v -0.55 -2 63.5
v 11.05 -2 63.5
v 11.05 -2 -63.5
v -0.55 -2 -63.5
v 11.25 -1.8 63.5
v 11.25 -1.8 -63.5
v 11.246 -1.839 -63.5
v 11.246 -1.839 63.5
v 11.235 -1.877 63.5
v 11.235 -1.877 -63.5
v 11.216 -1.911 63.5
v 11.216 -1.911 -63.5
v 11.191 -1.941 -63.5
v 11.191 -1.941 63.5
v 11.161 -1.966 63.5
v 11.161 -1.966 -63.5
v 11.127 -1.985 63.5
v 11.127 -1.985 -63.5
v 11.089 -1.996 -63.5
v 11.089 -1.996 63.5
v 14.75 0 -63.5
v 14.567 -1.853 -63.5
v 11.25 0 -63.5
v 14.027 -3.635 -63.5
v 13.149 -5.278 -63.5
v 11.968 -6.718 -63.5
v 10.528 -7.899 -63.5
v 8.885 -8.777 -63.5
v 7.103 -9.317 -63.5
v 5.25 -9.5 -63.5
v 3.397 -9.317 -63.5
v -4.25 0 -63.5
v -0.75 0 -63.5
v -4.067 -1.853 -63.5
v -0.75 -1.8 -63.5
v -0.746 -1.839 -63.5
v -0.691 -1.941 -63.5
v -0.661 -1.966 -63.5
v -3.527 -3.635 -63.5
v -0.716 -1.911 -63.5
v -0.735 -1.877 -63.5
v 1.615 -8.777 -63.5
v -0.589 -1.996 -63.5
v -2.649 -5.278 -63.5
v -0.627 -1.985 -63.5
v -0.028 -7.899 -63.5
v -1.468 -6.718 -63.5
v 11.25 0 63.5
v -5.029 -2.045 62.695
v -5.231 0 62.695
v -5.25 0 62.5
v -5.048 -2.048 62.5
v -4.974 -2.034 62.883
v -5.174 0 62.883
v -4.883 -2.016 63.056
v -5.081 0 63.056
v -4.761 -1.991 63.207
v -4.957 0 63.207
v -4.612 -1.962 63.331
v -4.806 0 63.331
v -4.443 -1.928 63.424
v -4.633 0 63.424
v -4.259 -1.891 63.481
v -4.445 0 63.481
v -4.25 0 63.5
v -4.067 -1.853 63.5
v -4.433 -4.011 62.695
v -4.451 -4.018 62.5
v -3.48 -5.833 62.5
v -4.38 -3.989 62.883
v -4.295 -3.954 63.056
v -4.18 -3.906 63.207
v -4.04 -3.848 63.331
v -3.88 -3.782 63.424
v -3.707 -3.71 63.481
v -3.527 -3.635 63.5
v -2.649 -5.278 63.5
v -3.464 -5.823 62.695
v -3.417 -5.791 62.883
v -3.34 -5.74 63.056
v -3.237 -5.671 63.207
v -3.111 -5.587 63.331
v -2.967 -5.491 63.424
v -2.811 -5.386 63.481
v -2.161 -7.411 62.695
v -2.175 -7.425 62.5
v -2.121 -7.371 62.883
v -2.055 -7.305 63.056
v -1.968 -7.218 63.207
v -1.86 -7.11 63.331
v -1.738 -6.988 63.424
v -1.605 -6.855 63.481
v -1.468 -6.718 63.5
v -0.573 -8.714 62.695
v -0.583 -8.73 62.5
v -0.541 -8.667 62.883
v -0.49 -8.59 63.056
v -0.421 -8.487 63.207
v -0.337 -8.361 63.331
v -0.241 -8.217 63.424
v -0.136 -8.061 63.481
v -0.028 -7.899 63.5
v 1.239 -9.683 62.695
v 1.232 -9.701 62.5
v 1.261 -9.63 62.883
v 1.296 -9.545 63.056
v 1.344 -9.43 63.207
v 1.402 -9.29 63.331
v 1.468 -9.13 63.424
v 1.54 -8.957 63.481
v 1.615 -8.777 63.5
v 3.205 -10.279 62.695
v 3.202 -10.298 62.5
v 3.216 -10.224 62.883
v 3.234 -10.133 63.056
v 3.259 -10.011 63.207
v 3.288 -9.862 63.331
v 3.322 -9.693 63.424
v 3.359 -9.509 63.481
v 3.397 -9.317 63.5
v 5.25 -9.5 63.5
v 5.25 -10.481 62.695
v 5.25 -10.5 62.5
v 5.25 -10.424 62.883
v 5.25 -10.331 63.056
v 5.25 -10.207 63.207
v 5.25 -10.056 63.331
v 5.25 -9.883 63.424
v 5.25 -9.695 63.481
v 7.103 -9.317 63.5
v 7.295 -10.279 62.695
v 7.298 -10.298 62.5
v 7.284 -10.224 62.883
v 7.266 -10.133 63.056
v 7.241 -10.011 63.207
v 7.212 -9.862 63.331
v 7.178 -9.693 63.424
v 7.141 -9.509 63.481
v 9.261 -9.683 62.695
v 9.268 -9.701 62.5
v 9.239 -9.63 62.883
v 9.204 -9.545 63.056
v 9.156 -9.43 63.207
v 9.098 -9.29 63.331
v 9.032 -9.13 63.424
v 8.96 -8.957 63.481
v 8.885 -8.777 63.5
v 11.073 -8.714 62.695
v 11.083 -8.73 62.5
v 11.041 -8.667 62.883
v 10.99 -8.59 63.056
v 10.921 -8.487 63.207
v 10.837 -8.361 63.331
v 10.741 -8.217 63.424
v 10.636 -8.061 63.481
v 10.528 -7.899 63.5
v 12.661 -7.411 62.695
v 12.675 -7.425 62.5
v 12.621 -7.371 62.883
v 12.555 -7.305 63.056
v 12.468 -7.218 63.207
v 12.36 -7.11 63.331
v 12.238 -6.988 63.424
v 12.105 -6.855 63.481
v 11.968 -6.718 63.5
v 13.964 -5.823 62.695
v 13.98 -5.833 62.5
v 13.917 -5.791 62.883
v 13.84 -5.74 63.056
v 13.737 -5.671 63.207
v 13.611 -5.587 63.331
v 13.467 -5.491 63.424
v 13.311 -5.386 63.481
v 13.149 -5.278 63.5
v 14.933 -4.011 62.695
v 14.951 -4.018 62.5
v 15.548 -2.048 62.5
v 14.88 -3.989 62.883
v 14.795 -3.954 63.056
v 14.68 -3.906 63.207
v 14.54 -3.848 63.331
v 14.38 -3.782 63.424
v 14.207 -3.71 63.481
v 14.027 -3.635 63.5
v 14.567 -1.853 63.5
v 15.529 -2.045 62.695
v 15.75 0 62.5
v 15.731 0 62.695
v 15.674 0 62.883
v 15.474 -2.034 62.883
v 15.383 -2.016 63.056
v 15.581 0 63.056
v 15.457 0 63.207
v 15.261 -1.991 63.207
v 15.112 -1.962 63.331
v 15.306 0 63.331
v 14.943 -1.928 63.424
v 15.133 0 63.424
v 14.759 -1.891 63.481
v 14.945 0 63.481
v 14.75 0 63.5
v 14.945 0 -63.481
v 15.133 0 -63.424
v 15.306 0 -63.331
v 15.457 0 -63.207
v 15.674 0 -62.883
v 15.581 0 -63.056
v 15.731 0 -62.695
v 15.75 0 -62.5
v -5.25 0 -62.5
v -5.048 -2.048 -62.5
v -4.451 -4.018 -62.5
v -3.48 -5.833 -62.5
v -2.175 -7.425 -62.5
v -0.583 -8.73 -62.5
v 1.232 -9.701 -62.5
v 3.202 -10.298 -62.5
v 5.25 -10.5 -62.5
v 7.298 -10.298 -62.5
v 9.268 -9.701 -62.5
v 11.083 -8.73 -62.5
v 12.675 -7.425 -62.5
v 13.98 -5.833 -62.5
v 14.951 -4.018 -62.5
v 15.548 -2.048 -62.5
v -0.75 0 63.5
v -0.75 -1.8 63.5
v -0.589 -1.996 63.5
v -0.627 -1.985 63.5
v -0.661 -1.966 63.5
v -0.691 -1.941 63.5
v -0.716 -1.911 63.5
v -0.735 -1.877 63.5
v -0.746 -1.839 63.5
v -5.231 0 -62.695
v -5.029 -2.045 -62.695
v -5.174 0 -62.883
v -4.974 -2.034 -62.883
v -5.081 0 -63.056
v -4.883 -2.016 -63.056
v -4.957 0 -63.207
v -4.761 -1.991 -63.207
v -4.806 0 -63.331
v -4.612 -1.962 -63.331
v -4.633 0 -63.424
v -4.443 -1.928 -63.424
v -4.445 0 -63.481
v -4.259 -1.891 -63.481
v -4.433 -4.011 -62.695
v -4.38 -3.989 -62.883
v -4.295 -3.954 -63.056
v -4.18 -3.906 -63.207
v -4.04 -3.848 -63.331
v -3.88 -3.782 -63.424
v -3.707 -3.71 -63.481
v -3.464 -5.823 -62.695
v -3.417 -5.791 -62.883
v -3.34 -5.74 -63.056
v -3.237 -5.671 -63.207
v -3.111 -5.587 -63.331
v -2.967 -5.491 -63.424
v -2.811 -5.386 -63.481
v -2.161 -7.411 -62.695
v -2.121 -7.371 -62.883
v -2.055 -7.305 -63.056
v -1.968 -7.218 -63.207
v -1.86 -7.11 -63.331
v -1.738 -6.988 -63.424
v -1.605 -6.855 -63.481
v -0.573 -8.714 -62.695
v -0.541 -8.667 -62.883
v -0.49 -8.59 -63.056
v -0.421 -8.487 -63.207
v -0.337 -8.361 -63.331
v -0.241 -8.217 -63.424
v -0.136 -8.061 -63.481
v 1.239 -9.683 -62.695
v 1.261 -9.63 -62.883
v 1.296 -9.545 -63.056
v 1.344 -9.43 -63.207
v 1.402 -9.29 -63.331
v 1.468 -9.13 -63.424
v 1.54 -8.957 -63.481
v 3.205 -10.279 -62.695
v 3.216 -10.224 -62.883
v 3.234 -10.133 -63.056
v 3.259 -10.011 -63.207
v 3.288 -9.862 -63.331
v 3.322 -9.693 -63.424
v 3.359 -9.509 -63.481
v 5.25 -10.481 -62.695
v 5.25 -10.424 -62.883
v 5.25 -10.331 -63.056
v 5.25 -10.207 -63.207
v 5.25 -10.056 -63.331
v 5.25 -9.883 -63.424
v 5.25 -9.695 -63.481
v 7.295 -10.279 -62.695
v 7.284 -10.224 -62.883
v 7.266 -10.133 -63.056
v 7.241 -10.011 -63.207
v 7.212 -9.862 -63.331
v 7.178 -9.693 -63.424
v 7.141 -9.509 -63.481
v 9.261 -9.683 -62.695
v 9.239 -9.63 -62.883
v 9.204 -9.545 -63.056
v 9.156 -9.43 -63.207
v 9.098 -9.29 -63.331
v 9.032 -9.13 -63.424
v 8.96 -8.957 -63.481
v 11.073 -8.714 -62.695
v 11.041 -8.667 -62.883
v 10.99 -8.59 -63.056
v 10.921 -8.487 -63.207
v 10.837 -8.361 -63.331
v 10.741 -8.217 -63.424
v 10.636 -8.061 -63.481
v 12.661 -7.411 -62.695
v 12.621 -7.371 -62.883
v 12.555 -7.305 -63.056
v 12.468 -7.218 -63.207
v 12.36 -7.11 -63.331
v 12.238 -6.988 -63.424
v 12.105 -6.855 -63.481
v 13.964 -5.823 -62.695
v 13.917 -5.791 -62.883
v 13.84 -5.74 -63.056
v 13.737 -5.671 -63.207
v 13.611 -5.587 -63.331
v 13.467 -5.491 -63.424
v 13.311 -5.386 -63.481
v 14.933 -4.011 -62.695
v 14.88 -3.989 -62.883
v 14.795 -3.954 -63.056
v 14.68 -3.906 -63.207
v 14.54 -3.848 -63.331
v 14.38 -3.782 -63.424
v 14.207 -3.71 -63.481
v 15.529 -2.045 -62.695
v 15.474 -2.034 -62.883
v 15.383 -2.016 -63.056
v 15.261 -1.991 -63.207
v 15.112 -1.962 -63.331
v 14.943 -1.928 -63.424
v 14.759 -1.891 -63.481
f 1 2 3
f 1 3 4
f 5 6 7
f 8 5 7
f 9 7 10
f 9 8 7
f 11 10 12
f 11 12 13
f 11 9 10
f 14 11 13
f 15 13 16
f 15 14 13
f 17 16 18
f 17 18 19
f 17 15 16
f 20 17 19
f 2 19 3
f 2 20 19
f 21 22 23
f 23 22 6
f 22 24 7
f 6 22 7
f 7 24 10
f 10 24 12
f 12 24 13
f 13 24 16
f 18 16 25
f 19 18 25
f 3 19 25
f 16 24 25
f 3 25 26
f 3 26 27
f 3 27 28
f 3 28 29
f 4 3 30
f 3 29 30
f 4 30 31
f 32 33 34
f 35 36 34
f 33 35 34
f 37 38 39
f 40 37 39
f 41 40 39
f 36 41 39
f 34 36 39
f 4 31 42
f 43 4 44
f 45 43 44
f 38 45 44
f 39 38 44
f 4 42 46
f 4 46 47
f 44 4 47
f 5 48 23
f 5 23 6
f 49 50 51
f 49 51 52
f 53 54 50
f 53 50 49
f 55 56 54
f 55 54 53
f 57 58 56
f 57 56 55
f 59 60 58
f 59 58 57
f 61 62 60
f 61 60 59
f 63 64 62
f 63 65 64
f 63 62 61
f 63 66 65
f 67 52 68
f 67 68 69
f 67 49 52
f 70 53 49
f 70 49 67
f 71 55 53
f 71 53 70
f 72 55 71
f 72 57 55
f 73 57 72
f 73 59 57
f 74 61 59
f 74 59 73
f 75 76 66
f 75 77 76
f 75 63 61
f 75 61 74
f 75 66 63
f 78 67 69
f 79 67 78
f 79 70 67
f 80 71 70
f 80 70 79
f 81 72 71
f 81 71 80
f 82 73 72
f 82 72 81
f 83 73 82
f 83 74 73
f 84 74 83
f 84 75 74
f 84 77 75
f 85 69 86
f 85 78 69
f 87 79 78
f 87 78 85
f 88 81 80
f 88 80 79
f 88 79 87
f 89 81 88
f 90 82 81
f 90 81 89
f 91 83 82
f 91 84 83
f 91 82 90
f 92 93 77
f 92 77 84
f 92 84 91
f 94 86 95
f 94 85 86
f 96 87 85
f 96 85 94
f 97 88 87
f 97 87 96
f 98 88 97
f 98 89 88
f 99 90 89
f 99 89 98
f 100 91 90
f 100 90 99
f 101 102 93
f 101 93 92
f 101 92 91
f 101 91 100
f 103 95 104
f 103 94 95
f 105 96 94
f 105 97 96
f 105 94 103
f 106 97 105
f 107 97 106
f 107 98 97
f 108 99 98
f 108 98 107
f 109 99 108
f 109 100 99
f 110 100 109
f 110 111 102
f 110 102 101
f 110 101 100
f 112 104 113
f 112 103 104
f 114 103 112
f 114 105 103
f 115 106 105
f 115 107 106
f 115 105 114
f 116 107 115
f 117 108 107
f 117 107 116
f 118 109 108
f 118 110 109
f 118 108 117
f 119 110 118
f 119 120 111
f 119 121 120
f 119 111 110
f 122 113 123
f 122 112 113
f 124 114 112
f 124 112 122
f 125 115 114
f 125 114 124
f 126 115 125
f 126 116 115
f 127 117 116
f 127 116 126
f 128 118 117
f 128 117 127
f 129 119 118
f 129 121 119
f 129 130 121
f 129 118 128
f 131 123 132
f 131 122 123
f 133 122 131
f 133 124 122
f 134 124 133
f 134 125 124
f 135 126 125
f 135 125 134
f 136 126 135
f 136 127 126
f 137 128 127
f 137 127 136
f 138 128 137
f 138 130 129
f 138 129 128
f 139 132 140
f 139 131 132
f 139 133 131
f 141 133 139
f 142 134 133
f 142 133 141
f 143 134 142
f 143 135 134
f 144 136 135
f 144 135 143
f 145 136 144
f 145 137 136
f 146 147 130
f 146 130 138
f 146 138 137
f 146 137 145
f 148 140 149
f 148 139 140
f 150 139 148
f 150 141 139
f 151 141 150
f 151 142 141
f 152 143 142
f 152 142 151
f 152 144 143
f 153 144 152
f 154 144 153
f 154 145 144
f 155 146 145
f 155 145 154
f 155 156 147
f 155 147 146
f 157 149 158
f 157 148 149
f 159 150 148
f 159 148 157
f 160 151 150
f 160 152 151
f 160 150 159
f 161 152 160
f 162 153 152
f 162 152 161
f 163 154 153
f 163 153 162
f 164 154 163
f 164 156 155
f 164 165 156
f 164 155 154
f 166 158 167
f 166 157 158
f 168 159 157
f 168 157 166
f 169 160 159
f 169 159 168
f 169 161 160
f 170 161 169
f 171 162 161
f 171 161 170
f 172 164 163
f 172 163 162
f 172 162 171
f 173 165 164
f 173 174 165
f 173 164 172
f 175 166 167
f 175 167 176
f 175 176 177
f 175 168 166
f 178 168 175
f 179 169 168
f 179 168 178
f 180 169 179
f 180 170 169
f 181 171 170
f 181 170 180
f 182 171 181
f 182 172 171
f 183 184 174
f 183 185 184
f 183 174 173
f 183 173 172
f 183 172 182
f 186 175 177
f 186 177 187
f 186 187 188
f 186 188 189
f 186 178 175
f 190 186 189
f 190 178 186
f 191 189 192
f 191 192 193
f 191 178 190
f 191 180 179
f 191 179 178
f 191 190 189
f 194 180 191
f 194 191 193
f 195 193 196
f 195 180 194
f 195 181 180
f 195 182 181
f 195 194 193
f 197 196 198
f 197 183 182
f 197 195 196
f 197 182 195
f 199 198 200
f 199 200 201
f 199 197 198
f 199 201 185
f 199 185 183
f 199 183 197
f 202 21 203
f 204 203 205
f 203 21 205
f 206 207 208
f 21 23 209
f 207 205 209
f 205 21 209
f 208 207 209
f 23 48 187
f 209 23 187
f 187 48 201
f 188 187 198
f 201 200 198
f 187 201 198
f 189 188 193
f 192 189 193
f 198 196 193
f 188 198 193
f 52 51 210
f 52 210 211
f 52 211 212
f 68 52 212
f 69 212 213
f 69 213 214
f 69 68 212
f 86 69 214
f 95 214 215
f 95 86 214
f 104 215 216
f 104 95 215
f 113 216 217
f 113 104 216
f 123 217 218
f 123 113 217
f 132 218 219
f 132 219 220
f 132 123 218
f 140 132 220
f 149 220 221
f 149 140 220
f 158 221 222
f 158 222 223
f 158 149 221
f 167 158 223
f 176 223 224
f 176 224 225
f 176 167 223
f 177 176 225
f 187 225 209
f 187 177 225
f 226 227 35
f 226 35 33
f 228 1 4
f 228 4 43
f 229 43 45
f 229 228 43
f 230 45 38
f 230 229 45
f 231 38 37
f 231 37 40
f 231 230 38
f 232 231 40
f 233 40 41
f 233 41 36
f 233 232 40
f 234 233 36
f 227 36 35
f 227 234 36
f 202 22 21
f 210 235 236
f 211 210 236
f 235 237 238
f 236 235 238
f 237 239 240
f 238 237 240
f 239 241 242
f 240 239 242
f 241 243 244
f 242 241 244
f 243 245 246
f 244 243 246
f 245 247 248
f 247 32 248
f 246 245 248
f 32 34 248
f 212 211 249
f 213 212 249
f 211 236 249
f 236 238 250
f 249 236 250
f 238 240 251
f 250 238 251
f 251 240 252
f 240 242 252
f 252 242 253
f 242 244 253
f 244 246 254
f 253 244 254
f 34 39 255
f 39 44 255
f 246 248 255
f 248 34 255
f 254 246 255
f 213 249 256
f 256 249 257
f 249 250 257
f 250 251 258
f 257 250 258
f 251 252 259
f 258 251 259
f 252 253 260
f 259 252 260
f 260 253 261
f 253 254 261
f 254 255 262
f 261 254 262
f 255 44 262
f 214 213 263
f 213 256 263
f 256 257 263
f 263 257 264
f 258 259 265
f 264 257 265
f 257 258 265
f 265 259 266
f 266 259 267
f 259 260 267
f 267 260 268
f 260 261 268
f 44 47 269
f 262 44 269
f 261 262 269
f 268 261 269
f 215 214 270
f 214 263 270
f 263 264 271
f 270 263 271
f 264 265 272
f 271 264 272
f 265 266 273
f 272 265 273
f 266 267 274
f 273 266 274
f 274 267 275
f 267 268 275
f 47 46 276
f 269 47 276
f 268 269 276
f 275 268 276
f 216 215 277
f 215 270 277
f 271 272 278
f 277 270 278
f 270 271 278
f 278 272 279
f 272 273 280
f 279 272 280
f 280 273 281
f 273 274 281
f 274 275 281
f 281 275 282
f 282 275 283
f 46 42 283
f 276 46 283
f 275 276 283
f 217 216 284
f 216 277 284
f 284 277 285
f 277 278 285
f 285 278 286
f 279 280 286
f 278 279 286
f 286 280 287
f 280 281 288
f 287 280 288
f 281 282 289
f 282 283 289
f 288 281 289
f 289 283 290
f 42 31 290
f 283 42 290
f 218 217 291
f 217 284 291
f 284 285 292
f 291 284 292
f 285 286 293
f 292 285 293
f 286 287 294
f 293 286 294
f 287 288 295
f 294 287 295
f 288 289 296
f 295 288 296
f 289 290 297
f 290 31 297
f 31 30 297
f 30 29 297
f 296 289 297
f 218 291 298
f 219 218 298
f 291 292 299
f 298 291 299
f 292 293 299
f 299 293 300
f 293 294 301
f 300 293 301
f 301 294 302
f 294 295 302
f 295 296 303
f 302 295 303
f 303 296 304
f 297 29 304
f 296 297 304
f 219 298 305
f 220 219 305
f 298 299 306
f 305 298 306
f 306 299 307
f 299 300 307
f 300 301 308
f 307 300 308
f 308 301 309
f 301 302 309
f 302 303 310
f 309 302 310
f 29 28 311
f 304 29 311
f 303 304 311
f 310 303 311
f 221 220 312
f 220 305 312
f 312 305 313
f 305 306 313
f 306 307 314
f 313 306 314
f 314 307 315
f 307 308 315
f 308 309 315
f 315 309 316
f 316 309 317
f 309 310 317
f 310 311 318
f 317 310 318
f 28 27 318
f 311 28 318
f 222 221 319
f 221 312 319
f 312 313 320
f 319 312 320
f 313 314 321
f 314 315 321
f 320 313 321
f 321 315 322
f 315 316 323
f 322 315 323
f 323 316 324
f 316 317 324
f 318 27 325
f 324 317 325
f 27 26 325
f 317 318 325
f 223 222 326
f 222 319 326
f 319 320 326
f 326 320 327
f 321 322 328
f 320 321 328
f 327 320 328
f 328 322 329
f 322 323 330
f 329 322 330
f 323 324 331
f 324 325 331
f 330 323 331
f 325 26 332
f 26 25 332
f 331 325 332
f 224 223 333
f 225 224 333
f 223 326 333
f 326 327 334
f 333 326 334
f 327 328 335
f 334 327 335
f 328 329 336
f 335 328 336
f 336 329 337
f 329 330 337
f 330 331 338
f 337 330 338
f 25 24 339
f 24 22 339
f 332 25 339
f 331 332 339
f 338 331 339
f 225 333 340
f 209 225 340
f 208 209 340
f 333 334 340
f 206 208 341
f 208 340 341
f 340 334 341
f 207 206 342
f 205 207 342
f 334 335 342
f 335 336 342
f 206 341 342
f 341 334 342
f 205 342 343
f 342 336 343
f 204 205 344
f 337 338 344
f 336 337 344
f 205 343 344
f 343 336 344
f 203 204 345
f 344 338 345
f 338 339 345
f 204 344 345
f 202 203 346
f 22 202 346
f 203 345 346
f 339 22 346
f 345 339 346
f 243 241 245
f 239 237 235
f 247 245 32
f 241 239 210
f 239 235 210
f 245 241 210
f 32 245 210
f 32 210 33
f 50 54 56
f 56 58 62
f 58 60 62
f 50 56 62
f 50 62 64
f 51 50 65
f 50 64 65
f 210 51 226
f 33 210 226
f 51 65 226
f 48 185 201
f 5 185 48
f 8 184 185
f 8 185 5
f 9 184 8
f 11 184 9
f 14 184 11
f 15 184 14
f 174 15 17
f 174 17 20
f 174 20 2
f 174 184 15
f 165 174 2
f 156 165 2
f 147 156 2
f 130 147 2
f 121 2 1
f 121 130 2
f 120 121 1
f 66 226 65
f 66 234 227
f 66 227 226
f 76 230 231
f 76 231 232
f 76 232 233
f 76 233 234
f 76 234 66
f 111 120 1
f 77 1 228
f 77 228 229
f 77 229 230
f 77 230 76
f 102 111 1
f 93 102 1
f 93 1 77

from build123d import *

# Parameters (mm, degrees)
F0_W     = 10.5
F0_H     = 127
F1_ANGLE = 180
F3_DEPTH = 127
F4_R     = 1
F5_R     = 1


with BuildPart() as f1:
    # F0 (on Front) → F1 (revolve)
    with BuildSketch(Plane.XZ):
        Rectangle(F0_W, F0_H)
    revolve(axis=Axis((5.25, 0, 0), (0, 0, -1)), revolution_arc=F1_ANGLE)

    # F2 (on face) → F3 (cut)
    with BuildSketch(Plane.XY.offset(63.5)):
        with BuildLine():
            Line((-0.75, 0), (5.25, 0))
            Line((5.25, 0), (11.25, 0))
            Line((11.25, 0), (11.25, 1.8))
            ThreePointArc((11.25, 1.8), (11.1914213562, 1.9414213562), (11.05, 2))
            Line((11.05, 2), (-0.55, 2))
            ThreePointArc((-0.55, 2), (-0.6914213562, 1.9414213562), (-0.75, 1.8))
            Line((-0.75, 1.8), (-0.75, 0))
        make_face()
    extrude(amount=-F3_DEPTH, mode=Mode.SUBTRACT)

    # F4
    f4_edges = [f1.edges().sort_by_distance(p)[0] for p in [
        (5.25, 10.5, 63.5),
    ]]
    fillet(f4_edges, radius=F4_R)

    # F5
    f5_edges = [f1.edges().sort_by_distance(p)[0] for p in [
        (5.25, 10.5, -63.5),
    ]]
    fillet(f5_edges, radius=F5_R)


with BuildPart() as f6_1:
    # F6: instance of F1
    add(f1.part.mirror(Plane.XZ))


solid = f6_1.part
